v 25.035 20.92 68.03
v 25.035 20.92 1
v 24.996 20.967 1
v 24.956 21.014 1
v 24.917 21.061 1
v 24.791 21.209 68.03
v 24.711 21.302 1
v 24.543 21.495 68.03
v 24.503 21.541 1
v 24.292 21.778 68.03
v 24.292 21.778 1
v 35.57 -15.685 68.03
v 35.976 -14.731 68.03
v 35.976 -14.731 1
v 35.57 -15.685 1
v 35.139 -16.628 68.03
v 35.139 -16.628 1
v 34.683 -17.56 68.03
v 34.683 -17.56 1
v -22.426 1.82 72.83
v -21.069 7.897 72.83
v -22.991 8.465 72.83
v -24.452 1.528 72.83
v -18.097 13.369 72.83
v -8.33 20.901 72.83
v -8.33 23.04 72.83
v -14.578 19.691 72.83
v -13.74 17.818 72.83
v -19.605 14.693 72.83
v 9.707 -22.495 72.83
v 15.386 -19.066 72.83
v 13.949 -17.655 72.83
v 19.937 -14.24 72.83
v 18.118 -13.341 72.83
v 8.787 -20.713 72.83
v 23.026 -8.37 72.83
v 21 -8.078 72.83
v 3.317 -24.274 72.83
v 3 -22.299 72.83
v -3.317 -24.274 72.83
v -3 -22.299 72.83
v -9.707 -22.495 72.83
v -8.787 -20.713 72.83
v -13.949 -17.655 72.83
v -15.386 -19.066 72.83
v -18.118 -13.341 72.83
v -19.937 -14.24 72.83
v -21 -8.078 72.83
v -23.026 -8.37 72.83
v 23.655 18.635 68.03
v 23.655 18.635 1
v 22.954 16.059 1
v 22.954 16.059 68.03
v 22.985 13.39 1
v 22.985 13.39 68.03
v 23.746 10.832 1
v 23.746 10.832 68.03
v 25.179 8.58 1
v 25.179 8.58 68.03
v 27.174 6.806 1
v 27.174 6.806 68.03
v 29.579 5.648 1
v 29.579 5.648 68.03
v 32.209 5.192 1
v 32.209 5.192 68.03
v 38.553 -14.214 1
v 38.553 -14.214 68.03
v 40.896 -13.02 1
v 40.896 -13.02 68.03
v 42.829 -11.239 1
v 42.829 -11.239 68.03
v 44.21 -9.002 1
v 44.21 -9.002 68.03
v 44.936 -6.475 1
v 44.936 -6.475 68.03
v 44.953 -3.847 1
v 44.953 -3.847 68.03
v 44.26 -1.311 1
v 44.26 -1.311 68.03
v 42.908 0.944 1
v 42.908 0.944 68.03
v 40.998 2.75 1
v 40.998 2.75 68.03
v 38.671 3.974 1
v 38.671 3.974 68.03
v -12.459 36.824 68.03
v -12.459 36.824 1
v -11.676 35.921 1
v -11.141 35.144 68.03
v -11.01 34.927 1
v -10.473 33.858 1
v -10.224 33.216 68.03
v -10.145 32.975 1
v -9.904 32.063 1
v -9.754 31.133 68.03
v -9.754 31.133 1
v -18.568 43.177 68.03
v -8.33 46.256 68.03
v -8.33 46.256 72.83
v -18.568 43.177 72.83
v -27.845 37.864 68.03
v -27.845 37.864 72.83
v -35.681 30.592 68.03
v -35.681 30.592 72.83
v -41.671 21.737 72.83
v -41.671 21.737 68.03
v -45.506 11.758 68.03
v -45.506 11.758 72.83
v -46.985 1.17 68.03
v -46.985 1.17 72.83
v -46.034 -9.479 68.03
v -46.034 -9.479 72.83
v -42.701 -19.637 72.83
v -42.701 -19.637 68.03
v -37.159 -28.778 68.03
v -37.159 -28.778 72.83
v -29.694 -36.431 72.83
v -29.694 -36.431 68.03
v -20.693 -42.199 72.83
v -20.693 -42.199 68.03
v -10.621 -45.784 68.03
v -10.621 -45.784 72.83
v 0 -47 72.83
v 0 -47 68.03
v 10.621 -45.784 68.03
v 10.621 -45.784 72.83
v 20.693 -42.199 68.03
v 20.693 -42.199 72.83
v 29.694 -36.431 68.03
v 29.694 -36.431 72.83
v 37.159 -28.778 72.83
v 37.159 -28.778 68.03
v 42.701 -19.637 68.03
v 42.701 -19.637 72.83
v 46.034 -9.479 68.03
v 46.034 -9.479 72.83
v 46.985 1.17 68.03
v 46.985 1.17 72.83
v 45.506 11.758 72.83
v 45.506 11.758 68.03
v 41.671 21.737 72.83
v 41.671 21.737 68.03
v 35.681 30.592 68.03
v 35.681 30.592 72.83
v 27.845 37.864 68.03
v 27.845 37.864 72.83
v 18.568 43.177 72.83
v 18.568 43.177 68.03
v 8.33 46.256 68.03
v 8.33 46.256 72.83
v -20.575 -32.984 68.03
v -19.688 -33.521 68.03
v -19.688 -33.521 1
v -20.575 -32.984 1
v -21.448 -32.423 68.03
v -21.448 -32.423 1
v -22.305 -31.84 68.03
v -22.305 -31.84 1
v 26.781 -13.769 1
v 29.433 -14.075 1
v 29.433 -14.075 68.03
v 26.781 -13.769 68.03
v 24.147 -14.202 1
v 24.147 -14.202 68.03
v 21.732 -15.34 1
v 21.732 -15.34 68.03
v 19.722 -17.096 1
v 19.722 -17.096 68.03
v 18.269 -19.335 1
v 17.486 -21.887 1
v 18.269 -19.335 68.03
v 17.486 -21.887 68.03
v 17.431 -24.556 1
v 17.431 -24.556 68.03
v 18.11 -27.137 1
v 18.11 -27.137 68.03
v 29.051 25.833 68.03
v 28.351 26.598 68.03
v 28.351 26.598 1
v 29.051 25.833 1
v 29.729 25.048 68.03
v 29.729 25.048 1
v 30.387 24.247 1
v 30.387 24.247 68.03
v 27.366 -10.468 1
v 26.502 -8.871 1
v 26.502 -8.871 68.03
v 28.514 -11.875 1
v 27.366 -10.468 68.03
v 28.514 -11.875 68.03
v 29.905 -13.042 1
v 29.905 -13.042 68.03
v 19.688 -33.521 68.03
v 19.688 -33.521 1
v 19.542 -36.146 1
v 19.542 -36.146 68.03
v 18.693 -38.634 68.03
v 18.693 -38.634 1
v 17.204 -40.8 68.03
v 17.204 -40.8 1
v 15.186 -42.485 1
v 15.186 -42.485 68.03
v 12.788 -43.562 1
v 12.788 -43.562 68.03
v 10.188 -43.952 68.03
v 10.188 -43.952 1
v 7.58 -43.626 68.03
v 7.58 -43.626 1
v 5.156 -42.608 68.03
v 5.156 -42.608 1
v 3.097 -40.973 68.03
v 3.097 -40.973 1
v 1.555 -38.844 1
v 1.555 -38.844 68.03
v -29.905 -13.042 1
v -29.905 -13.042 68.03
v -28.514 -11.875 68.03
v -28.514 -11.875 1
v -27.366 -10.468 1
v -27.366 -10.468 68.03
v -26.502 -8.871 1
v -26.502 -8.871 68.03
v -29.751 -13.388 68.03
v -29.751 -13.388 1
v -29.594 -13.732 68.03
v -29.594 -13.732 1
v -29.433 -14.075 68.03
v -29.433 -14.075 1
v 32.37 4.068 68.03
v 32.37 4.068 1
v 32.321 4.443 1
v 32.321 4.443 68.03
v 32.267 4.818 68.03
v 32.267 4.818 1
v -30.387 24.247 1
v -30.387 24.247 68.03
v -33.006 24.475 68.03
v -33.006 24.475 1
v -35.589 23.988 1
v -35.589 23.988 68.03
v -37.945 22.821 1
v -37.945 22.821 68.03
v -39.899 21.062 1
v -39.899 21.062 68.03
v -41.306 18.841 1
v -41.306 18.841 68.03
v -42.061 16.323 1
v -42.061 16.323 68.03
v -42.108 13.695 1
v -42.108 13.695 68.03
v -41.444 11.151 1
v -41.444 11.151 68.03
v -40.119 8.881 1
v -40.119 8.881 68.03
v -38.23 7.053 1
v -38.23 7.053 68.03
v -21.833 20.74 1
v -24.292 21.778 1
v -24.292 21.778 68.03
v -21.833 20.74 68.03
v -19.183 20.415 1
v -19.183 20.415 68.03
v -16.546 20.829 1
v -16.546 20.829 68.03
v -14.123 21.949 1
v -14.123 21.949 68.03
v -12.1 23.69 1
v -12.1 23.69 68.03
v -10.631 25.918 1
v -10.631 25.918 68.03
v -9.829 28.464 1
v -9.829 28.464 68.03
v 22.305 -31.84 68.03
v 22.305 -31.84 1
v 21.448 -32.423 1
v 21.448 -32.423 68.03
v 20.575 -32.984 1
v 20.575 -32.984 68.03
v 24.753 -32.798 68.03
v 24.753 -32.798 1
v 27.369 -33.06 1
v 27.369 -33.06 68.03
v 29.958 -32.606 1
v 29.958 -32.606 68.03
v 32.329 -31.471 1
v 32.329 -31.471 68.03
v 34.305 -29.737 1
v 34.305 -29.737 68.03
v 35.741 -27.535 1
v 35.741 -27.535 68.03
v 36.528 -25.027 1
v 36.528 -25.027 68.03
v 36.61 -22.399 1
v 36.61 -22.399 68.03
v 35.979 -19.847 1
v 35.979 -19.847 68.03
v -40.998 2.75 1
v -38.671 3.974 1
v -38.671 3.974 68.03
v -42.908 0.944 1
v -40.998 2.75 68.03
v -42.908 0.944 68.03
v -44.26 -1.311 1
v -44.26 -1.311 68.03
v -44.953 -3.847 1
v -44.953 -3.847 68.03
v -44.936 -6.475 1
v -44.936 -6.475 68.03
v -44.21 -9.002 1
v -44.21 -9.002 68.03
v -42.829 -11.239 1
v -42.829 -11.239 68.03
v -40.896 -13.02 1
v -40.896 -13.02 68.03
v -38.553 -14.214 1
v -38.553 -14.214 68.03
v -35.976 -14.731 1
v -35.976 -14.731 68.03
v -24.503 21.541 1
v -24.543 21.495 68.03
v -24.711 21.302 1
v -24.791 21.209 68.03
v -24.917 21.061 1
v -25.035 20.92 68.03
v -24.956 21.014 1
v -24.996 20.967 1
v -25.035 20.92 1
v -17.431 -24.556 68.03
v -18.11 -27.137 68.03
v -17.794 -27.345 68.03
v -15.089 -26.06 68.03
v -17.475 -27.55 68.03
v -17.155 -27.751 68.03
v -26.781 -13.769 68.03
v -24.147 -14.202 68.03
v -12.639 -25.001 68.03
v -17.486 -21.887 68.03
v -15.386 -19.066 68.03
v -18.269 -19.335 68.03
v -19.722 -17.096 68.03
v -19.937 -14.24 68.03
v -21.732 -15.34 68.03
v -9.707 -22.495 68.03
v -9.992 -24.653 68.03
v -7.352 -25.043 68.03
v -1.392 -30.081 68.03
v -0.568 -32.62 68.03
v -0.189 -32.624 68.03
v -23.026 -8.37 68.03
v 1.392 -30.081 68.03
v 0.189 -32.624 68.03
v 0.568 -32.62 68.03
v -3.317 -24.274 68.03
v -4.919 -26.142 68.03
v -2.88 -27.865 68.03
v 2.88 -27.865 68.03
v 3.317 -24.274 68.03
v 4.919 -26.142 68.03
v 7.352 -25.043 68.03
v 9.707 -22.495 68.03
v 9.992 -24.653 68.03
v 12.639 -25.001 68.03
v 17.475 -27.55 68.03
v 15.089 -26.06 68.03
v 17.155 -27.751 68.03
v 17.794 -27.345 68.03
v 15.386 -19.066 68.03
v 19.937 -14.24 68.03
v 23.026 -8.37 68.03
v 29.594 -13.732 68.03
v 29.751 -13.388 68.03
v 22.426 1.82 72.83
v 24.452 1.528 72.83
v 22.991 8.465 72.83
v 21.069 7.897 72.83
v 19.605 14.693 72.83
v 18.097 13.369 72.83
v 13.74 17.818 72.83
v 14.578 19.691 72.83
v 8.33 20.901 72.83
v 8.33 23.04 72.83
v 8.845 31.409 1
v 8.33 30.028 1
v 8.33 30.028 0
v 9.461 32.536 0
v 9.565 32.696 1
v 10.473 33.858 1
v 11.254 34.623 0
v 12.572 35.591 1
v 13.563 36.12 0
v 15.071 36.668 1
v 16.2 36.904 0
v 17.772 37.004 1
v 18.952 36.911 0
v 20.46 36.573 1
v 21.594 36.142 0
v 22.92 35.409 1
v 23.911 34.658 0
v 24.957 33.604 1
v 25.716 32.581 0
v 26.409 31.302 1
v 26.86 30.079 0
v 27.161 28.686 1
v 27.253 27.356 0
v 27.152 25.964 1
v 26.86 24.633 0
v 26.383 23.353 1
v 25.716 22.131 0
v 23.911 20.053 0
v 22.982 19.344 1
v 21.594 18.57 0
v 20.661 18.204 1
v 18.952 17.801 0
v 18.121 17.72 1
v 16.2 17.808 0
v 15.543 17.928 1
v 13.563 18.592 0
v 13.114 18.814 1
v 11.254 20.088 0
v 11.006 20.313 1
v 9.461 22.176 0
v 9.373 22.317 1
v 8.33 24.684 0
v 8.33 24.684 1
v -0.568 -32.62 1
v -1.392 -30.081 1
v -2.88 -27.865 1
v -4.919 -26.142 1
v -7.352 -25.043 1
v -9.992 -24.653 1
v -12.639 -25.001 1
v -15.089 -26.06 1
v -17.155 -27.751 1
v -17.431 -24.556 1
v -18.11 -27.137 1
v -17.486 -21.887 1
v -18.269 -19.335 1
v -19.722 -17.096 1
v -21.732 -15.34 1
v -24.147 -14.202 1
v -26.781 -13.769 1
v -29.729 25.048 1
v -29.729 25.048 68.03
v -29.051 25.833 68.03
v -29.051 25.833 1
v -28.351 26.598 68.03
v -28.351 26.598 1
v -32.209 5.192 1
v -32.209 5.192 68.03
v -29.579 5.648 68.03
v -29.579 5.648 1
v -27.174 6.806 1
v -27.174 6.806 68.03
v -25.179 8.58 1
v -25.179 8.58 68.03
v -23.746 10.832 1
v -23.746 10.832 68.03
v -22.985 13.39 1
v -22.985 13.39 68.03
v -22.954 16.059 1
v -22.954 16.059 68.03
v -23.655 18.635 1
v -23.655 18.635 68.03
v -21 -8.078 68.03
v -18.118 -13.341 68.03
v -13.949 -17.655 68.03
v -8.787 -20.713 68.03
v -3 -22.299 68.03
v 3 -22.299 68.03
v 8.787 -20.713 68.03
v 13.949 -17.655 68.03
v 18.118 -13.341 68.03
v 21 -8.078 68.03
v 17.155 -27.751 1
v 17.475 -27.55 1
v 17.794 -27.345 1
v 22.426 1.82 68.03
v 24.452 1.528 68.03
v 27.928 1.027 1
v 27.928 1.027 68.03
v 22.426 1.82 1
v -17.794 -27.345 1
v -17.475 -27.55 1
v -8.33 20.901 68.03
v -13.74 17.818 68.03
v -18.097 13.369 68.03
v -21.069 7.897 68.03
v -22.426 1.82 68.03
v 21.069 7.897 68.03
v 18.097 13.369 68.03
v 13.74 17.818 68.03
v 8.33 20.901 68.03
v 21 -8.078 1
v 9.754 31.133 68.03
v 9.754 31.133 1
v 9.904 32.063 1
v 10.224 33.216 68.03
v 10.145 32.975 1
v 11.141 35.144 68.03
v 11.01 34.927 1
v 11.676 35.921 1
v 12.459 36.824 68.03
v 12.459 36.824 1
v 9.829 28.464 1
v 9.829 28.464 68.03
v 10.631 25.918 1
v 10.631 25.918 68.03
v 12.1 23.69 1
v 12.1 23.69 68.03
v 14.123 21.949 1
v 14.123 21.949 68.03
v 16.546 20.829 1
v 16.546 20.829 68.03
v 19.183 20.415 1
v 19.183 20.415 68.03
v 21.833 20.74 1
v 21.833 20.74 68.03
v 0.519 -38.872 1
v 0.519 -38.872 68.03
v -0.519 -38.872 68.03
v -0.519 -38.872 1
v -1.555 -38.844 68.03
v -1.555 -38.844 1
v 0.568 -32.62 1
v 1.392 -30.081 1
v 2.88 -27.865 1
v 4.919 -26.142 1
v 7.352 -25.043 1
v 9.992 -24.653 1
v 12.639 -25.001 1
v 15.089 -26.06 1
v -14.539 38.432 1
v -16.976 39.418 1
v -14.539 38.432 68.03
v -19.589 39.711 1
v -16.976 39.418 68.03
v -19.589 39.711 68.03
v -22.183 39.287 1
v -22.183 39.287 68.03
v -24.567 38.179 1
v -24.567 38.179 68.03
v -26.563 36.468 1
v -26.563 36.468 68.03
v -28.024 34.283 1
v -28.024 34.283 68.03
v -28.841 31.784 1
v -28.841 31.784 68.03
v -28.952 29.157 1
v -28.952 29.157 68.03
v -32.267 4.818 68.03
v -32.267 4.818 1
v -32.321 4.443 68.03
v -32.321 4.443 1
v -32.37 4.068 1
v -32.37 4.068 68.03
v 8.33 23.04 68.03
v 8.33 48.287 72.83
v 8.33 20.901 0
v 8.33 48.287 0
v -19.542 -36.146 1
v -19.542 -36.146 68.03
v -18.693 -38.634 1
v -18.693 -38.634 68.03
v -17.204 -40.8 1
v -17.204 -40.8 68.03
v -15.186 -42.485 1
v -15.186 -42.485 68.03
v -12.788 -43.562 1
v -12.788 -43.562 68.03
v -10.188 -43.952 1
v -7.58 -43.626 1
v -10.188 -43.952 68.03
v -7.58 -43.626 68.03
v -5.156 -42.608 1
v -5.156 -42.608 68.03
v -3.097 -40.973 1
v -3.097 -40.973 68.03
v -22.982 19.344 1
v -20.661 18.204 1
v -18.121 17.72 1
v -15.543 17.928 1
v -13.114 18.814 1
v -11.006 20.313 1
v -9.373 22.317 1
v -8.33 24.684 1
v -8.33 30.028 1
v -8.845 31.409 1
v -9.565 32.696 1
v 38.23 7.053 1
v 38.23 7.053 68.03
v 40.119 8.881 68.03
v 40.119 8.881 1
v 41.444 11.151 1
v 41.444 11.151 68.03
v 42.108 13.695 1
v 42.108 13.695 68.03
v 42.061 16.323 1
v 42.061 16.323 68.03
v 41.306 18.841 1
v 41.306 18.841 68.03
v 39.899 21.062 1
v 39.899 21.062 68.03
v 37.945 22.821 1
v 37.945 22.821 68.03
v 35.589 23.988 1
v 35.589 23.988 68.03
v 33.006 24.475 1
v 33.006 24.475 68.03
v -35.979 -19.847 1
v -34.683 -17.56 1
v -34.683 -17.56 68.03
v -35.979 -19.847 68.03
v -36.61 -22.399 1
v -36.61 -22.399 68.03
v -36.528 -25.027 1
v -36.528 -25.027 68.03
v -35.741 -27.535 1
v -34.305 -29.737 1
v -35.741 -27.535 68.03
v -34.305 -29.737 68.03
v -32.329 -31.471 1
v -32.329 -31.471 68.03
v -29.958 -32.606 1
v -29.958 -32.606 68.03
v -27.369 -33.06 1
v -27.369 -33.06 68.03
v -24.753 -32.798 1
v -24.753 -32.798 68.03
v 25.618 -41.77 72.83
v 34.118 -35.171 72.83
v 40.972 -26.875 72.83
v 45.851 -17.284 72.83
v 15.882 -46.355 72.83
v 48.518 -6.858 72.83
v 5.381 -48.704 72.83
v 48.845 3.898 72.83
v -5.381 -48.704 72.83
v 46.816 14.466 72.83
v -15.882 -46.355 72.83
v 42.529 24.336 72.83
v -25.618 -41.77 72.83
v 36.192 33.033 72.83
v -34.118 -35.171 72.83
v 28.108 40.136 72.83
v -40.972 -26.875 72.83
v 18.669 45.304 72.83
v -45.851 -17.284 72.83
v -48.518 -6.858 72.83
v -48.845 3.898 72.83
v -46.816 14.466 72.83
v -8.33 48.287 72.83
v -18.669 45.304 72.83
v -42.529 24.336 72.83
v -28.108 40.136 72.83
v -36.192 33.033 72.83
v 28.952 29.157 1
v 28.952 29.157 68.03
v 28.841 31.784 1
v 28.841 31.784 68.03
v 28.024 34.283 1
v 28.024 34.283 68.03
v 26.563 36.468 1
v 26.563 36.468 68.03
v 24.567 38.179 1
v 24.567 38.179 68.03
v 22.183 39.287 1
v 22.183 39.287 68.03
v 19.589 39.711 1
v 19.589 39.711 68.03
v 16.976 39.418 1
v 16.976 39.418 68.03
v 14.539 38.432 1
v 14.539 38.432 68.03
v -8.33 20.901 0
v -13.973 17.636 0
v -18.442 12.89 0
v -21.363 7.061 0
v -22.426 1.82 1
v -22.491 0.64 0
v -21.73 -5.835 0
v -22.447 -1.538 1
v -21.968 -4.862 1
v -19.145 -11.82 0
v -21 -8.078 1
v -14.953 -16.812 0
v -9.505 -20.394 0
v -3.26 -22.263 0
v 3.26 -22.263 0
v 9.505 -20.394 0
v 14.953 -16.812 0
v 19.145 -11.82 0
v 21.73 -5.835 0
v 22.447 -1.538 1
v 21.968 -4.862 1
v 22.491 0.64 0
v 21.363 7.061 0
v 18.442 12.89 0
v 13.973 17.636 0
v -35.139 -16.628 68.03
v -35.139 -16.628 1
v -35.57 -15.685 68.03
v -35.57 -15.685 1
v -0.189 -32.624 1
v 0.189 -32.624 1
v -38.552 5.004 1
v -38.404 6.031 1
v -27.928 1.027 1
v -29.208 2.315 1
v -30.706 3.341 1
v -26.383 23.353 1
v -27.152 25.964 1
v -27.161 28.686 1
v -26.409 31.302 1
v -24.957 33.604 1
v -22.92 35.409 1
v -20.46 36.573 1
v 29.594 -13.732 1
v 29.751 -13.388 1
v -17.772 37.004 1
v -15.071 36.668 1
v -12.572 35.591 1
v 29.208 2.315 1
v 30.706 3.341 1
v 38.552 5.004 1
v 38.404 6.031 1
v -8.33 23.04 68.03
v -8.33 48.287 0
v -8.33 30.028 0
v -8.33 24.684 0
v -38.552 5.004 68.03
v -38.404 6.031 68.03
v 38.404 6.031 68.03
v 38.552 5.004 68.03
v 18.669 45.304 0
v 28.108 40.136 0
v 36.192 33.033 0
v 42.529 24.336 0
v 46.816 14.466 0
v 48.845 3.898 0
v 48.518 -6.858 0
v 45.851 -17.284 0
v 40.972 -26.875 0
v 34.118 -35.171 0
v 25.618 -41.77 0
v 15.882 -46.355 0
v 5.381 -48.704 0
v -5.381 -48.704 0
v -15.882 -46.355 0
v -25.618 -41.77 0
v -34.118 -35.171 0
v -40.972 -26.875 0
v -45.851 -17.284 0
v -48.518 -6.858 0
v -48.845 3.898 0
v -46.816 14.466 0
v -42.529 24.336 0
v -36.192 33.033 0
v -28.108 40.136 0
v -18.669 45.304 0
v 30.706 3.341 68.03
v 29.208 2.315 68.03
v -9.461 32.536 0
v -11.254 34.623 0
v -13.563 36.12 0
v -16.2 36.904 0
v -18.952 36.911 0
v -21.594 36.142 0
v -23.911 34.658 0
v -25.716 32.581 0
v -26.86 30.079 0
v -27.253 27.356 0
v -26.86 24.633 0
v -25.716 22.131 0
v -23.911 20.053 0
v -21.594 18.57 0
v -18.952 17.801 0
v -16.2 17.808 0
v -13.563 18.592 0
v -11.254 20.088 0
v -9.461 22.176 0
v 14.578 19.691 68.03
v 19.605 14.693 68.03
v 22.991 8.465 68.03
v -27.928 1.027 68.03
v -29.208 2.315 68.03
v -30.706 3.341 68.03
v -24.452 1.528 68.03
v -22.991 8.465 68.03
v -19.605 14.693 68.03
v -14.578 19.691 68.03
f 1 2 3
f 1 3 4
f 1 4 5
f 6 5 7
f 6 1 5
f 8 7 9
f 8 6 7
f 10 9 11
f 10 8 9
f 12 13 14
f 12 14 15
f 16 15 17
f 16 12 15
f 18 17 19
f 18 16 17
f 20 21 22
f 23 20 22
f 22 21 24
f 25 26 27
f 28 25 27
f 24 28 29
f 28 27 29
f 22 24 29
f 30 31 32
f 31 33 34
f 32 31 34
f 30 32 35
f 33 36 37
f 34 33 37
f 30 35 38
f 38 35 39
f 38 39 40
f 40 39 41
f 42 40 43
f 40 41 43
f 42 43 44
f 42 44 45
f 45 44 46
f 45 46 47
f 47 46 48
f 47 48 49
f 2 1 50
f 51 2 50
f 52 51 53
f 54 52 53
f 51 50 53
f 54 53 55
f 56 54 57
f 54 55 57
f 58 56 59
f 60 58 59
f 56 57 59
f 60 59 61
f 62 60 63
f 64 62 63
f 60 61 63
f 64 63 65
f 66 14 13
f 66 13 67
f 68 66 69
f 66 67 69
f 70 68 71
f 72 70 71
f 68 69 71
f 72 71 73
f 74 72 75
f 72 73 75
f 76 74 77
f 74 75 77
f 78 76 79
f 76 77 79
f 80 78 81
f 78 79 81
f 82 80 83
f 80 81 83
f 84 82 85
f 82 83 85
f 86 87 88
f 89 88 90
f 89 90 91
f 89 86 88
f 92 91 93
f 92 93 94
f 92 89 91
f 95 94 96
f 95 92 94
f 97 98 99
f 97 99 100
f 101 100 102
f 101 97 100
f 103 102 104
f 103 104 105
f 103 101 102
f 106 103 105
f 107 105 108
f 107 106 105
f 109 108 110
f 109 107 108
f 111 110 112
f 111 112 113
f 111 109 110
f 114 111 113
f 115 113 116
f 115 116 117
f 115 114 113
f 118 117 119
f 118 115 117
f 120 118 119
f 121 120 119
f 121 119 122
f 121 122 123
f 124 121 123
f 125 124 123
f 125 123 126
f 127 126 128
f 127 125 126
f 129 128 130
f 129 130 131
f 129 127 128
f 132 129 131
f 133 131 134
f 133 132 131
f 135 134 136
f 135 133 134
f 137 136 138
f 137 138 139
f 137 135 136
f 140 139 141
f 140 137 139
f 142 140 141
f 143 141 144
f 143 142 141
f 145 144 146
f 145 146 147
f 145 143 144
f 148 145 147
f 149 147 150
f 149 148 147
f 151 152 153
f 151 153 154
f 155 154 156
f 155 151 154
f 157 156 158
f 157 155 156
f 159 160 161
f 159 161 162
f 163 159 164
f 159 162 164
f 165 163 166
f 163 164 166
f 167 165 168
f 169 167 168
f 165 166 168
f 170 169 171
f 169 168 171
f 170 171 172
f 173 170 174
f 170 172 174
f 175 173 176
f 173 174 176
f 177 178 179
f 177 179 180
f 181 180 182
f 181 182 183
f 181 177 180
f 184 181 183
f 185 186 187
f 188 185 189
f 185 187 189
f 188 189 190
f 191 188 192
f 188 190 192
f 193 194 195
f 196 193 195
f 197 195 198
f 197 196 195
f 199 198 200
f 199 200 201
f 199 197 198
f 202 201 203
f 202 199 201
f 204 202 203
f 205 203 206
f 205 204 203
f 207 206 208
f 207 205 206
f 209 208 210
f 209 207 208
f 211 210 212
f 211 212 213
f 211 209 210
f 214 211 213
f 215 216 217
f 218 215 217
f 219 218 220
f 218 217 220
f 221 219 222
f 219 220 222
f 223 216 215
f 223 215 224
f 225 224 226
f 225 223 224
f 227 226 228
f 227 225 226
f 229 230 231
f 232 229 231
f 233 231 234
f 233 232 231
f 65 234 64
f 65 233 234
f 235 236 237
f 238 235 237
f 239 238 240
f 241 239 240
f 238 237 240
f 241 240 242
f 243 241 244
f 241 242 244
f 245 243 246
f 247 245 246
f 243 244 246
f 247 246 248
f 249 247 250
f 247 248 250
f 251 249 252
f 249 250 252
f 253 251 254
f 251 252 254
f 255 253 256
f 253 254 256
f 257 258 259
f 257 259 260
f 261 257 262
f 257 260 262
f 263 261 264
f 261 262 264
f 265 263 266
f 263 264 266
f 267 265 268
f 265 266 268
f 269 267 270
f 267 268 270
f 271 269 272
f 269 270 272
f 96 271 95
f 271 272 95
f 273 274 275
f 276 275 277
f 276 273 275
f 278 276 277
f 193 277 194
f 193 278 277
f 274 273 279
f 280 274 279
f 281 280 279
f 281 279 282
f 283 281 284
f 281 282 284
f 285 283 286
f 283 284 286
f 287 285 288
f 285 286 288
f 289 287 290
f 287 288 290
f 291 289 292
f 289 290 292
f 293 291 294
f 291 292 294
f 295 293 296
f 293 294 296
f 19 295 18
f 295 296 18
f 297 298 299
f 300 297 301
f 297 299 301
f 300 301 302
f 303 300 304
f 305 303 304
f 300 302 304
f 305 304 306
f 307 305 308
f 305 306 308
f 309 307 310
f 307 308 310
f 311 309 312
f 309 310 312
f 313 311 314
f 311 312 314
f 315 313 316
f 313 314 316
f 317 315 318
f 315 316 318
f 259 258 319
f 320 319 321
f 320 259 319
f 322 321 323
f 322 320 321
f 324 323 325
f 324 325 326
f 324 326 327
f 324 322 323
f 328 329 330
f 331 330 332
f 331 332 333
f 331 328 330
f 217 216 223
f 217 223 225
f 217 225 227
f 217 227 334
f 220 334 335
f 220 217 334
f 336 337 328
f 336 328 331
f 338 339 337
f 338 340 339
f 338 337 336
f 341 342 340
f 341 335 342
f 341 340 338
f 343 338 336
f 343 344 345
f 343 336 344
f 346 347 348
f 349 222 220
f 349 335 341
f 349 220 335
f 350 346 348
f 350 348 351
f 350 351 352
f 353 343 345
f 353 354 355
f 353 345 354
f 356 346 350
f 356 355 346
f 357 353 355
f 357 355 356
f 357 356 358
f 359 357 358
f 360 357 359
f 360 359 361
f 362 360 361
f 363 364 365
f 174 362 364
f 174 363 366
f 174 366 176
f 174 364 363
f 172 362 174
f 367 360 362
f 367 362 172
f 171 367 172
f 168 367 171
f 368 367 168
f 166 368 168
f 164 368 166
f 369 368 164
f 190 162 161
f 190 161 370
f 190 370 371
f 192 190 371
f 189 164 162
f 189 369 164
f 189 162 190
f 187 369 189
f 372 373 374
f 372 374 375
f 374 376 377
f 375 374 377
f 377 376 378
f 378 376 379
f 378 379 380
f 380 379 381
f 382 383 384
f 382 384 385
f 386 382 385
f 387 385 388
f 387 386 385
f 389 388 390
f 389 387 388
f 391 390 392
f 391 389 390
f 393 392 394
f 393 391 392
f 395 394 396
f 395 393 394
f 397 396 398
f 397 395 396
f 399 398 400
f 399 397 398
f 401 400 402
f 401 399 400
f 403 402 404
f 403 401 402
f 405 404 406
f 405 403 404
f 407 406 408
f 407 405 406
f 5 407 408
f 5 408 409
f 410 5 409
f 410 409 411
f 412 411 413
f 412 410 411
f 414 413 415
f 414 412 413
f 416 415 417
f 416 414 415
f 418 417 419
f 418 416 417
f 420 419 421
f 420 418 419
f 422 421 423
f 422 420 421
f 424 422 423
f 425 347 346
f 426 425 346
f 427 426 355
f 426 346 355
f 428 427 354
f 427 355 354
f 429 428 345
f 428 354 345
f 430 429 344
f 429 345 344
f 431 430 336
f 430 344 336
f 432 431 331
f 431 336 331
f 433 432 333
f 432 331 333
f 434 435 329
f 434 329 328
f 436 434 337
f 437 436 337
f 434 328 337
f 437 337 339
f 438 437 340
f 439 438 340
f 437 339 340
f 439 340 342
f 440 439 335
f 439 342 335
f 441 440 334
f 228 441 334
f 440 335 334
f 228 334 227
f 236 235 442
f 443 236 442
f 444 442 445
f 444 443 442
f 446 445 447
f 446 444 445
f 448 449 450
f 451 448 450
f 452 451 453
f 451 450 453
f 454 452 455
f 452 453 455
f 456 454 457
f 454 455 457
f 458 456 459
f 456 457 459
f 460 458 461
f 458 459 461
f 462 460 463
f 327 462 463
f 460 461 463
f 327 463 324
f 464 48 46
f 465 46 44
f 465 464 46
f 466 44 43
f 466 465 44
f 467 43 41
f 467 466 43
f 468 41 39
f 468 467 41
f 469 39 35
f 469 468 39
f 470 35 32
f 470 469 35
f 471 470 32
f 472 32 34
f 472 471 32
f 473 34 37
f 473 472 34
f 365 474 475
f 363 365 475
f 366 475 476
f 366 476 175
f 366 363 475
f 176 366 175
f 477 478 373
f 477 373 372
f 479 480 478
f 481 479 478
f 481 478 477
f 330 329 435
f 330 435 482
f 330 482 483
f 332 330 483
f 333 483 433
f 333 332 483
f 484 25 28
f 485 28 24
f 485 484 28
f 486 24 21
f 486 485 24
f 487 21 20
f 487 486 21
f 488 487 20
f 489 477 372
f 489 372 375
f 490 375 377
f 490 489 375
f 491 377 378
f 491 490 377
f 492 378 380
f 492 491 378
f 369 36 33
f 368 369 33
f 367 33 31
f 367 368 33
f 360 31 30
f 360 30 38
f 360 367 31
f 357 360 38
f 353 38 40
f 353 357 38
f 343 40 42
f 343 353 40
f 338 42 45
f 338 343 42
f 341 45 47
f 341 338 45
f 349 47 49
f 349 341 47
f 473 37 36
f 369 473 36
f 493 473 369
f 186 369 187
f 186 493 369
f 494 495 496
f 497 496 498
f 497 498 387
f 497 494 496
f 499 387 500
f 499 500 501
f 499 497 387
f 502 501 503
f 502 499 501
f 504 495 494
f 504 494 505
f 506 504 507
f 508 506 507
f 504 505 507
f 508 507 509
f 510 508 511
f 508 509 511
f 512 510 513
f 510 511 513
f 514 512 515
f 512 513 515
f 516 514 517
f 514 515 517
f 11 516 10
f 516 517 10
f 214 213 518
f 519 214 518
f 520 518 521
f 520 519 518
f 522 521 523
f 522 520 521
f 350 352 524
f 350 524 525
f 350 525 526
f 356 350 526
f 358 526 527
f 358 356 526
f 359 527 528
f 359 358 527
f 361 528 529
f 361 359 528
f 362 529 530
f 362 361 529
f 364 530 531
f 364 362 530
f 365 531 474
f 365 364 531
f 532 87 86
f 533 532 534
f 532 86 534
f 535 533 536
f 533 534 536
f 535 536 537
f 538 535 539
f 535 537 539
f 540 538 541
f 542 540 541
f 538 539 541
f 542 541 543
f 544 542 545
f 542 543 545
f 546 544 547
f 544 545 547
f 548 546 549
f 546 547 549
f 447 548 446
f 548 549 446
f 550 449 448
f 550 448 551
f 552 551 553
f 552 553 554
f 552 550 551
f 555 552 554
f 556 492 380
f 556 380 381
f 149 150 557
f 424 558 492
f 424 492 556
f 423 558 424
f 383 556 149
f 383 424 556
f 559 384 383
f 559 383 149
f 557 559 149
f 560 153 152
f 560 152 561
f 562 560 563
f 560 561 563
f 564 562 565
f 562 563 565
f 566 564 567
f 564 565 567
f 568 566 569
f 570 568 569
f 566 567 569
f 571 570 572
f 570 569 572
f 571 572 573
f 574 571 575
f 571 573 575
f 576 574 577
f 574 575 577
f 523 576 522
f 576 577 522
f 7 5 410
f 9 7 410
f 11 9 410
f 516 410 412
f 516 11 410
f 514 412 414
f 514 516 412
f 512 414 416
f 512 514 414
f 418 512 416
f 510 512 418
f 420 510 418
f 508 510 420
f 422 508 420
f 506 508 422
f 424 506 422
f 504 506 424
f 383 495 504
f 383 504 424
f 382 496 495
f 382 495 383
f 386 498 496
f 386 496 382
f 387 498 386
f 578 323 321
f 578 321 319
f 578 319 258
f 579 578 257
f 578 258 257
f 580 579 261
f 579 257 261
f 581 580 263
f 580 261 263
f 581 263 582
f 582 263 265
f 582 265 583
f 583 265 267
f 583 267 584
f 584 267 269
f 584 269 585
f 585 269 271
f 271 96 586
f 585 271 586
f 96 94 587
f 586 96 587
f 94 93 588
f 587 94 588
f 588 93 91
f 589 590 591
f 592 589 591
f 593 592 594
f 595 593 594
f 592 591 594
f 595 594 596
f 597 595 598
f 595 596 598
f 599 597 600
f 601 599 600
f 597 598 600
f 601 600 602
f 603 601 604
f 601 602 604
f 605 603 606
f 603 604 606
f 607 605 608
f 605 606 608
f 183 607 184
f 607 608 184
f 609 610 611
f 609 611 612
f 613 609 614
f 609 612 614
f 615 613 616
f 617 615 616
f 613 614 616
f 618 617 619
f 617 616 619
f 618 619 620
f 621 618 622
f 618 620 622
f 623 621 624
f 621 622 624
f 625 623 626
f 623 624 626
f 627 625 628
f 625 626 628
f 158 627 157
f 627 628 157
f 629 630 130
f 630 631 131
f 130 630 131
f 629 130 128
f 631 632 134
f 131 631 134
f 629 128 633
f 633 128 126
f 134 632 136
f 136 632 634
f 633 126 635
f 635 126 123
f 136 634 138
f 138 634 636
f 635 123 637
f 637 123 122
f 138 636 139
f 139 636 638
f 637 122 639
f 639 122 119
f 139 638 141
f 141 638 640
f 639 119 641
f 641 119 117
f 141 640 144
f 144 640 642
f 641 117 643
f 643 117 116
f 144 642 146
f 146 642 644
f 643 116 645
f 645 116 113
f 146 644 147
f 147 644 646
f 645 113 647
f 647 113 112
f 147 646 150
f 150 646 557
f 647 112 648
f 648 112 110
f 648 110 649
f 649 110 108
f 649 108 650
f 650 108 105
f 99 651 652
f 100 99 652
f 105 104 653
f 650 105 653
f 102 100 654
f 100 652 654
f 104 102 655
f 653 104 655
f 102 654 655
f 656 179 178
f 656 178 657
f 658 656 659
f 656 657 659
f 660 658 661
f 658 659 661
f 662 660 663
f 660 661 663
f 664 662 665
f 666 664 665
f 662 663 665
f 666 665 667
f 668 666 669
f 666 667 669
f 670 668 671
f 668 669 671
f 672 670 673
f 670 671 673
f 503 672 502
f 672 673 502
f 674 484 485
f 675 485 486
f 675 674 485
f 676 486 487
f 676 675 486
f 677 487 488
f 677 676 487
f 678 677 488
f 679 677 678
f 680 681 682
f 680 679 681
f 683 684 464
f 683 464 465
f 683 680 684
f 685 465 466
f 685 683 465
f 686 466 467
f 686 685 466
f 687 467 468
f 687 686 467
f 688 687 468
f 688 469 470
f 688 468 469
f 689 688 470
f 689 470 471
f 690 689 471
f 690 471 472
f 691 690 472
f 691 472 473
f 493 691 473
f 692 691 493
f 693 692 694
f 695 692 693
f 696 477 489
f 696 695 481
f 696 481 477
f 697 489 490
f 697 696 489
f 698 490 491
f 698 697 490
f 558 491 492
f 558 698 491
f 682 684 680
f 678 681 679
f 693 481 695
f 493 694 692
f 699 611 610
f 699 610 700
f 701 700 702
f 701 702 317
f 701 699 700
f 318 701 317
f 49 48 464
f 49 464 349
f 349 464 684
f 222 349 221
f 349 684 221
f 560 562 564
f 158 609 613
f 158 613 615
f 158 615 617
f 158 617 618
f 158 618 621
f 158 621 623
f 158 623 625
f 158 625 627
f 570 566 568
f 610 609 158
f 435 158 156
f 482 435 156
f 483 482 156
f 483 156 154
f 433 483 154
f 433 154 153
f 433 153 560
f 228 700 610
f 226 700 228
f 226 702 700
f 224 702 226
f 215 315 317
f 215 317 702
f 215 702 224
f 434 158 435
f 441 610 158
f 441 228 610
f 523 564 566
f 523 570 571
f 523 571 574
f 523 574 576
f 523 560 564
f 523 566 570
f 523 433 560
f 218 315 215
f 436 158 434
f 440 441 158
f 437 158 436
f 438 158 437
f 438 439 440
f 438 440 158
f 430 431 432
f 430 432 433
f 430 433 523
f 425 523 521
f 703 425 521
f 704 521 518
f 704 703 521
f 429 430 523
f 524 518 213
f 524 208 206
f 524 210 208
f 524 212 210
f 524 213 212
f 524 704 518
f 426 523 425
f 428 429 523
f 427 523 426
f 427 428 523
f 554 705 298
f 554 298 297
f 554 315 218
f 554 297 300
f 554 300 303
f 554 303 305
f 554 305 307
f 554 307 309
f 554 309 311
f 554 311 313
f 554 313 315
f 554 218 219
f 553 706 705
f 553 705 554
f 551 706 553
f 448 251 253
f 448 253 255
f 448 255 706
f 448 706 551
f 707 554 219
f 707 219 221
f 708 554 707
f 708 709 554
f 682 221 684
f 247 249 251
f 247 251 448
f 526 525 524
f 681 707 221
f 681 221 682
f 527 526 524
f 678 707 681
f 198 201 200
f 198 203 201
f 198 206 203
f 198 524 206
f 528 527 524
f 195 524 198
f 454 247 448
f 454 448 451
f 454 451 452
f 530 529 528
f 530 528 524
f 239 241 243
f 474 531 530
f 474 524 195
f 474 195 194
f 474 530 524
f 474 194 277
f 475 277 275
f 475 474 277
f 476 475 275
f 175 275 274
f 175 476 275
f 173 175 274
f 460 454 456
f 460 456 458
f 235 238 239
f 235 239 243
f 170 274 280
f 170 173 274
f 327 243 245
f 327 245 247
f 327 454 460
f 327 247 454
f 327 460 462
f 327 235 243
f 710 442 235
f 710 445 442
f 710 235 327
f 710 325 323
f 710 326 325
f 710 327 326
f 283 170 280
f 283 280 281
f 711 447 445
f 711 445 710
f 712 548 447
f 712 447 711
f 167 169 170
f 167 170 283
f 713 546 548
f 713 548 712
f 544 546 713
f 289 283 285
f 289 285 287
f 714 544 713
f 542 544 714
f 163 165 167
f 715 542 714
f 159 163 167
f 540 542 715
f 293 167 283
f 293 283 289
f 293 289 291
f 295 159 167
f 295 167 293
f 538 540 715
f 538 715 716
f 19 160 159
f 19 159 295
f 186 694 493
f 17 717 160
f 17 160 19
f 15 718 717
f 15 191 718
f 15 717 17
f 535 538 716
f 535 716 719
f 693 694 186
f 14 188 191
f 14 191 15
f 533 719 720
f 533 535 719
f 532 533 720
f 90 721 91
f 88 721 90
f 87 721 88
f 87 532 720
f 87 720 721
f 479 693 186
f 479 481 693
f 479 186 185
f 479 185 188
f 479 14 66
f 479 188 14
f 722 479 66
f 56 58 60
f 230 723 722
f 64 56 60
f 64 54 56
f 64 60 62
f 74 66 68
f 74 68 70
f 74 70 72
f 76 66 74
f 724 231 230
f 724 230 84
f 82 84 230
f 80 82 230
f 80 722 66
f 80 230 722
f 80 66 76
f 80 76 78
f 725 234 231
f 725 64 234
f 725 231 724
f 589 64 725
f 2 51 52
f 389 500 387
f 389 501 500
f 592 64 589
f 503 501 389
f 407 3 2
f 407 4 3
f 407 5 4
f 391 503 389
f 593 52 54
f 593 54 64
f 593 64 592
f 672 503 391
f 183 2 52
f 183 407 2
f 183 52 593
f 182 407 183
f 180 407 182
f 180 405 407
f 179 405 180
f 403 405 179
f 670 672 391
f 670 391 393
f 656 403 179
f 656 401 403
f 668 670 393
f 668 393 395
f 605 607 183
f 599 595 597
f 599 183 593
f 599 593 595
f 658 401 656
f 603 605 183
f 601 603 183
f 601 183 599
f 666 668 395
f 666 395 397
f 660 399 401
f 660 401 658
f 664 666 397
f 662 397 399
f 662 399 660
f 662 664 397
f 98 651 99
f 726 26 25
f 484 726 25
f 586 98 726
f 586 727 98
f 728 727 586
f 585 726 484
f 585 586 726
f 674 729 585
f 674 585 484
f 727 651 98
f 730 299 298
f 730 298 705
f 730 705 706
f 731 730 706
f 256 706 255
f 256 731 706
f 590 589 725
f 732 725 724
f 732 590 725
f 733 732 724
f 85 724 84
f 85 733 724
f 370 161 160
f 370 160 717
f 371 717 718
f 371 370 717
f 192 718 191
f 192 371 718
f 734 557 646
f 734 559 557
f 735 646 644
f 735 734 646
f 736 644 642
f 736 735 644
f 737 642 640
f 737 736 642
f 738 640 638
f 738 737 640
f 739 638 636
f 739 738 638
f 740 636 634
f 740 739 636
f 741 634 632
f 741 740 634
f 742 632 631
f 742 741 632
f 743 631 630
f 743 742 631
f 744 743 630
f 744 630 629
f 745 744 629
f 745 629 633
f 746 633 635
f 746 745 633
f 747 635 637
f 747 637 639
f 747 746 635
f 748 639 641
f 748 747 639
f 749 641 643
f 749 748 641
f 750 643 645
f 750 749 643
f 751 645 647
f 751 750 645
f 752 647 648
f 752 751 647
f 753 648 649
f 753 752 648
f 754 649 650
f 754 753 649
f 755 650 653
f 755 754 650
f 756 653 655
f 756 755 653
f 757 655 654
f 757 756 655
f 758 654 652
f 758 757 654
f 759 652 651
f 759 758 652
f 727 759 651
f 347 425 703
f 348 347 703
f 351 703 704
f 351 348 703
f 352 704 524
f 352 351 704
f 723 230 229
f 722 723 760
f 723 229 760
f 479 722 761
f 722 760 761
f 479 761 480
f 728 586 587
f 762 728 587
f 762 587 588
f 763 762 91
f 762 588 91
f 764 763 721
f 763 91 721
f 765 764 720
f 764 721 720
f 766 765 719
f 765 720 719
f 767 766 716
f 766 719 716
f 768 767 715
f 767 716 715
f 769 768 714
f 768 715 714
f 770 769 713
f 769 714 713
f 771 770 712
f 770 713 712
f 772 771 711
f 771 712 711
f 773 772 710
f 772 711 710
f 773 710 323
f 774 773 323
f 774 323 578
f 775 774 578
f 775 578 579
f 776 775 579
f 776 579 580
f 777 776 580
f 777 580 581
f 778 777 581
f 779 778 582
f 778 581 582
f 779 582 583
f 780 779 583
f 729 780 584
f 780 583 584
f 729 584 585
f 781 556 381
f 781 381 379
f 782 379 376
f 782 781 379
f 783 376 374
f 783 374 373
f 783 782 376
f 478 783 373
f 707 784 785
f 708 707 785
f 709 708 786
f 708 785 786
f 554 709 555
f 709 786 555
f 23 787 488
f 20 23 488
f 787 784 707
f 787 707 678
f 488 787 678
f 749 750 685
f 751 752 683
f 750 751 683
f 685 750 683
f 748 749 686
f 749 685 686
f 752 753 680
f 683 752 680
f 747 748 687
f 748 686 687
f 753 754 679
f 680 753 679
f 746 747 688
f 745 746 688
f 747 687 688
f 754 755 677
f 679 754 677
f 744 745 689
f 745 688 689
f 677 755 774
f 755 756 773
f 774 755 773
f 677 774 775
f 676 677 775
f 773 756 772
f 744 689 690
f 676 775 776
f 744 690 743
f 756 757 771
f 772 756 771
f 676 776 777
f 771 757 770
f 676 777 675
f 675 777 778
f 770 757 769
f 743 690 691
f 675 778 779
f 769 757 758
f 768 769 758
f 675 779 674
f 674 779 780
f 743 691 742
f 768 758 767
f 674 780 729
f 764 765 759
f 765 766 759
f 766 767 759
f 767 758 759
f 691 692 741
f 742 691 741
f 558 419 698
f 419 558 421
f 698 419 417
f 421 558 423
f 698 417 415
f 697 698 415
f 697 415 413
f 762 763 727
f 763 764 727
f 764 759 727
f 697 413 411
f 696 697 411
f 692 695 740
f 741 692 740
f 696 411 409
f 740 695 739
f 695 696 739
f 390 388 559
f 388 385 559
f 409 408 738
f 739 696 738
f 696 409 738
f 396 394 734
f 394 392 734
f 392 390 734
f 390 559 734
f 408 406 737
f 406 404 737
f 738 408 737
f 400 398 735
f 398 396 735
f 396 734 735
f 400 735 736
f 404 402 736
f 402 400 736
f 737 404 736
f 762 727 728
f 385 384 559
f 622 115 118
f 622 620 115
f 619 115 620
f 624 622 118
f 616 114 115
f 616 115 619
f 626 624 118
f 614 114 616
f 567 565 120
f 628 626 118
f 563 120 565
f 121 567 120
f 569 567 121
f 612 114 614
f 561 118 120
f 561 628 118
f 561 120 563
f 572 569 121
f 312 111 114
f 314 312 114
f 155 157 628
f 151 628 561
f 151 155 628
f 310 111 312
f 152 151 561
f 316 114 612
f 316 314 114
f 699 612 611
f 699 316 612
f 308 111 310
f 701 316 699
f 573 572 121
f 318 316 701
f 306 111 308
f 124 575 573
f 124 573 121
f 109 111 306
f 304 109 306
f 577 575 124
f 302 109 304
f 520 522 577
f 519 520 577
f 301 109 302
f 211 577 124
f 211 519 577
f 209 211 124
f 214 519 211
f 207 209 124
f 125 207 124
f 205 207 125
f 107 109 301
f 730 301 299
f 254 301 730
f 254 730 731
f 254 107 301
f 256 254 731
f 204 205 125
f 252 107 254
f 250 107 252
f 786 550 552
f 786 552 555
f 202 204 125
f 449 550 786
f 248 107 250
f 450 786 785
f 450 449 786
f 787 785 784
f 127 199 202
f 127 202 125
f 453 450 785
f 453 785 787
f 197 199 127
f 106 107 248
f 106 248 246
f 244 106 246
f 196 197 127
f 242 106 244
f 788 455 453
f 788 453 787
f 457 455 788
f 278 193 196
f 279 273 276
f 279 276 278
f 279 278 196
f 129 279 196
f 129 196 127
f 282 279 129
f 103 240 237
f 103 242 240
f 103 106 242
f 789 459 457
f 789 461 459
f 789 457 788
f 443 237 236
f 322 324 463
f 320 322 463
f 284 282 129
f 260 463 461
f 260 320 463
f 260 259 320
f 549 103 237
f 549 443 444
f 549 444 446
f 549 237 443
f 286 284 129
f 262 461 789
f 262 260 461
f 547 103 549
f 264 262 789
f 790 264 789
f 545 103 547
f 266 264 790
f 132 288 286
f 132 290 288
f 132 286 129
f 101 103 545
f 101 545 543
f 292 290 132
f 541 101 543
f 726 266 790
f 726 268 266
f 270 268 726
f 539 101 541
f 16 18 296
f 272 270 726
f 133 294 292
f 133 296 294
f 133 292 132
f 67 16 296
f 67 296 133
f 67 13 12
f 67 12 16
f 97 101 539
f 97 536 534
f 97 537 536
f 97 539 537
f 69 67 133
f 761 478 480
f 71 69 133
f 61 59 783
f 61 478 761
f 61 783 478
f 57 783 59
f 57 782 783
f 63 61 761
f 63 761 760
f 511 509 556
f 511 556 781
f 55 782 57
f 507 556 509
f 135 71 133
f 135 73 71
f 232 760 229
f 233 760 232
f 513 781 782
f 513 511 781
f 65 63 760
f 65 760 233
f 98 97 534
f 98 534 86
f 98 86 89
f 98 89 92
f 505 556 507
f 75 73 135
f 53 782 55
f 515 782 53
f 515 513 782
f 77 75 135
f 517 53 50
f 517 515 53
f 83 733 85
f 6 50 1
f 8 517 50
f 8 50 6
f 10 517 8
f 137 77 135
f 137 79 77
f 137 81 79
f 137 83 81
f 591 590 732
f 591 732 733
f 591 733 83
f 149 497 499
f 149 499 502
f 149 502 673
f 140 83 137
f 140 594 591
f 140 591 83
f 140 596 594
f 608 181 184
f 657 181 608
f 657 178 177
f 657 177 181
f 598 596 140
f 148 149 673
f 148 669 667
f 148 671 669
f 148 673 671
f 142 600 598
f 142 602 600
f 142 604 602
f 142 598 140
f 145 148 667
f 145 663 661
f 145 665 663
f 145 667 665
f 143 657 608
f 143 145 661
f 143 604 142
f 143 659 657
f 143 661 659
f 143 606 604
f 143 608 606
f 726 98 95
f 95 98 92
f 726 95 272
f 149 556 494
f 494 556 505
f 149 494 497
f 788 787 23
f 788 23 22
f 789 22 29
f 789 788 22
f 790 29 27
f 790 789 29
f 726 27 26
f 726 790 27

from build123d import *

# Parameters (mm, degrees)
BASIC_SHAPE_SKETCH_R                = 49
BASIC_SHAPE_SKETCH_R_2              = 22.5
BASIC_SHAPE_DEPTH                   = 68.03
SLIT_DEPTH                          = 98.108603635
BATTERY_SLOT_SKETCH_R               = 9.65
BATTERY_SLOT_DEPTH                  = 67.03
PATTERN_BATTERY_SLOT_COUNT          = 5
PATTERN_BATTERY_SLOT_ANGLE          = 130.88
MIRROR_BATTERY_SLOT_COPY_1_SKETCH_R = 9.65
MIRROR_BATTERY_SLOT_COPY_1_DEPTH    = 67.03
MIRROR_BATTERY_SLOT_COPY_2_SKETCH_R = 9.65
MIRROR_BATTERY_SLOT_COPY_2_DEPTH    = 67.03
MIRROR_BATTERY_SLOT_COPY_3_SKETCH_R = 9.65
MIRROR_BATTERY_SLOT_COPY_3_DEPTH    = 67.03
MIRROR_BATTERY_SLOT_COPY_4_SKETCH_R = 9.65
MIRROR_BATTERY_SLOT_COPY_4_DEPTH    = 67.03
BUS_SLIT_DEPTH                      = 67.03
CAP_INNER_LIP_DEPTH                 = 4.8
CAP_OUTER_LIP_DEPTH                 = 4.8
WIRE_SLITS_DEPTH                    = 98.108603635
WIRE_SLITS_DEPTH_BACK               = 67.03
PENNY_HOLE_SKETCH_R                 = 9.65
PENNY_HOLE_DEPTH                    = 100.807559333


with BuildPart() as part:
    # Basic_Shape_Sketch → Basic_Shape (new body)
    with BuildSketch(Plane.XY):
        Circle(BASIC_SHAPE_SKETCH_R)
        Circle(BASIC_SHAPE_SKETCH_R_2, mode=Mode.SUBTRACT)
    extrude(amount=BASIC_SHAPE_DEPTH)

    # Slit_Sketch → Slit (cut, through all)
    with BuildSketch(Plane.XY.offset(68.03)):
        with BuildLine():
            Line((-8.33, 48.286759055), (-8.33, 20.901222452))
            Line((-8.33, 20.901222452), (8.33, 20.901222452))
            Line((8.33, 20.901222452), (8.33, 48.286759055))
            ThreePointArc((8.33, 48.286759055), (0, 56.616759055), (-8.33, 48.286759055))
        make_face()
    extrude(amount=-SLIT_DEPTH, mode=Mode.SUBTRACT)

    # Battery_Slot_Sketch → Battery_Slot (cut)
    with BuildSketch(Plane.XY.offset(68.03)):
        with Locations((-10.069761866, -34.302512969)):
            Circle(BATTERY_SLOT_SKETCH_R)
    battery_slot = extrude(amount=-BATTERY_SLOT_DEPTH, mode=Mode.SUBTRACT)

    # Pattern_Battery_Slot: Battery_Slot ×5 about axis
    pattern_battery_slot_axis = Axis((0, 0, 0), (0, 0, -1))
    for i in range(1, PATTERN_BATTERY_SLOT_COUNT):
        add(battery_slot.rotate(pattern_battery_slot_axis, i * PATTERN_BATTERY_SLOT_ANGLE / (PATTERN_BATTERY_SLOT_COUNT - 1)), mode=Mode.SUBTRACT)

    # Mirror_Battery_Slot: Battery_Slot across plane
    add(battery_slot.mirror(Plane(origin=(0, 0, 0), x_dir=(0, 0, 1), z_dir=(1, 0, 0))), mode=Mode.SUBTRACT)

    # Mirror_Battery_Slot copy 1 sketch → Mirror_Battery_Slot copy 1 (cut)
    with BuildSketch(Plane(origin=(0, 0, 68.03), x_dir=(-0.8413221512344797, -0.5405340302350882, 0), z_dir=(0, 0, 1))):
        with Locations((-10.069761866, 34.302512969)):
            Circle(MIRROR_BATTERY_SLOT_COPY_1_SKETCH_R)
    extrude(amount=-MIRROR_BATTERY_SLOT_COPY_1_DEPTH, mode=Mode.SUBTRACT)

    # Mirror_Battery_Slot copy 2 sketch → Mirror_Battery_Slot copy 2 (cut)
    with BuildSketch(Plane(origin=(0, 0, 68.03), x_dir=(-0.4156459243156256, -0.9095265062656553, 0), z_dir=(0, 0, 1))):
        with Locations((-10.069761866, 34.302512969)):
            Circle(MIRROR_BATTERY_SLOT_COPY_2_SKETCH_R)
    extrude(amount=-MIRROR_BATTERY_SLOT_COPY_2_DEPTH, mode=Mode.SUBTRACT)

    # Mirror_Battery_Slot copy 3 sketch → Mirror_Battery_Slot copy 3 (cut)
    with BuildSketch(Plane(origin=(0, 0, 68.03), x_dir=(0.14193790484034807, -0.9898755634773152, 0), z_dir=(0, 0, 1))):
        with Locations((-10.069761866, 34.302512969)):
            Circle(MIRROR_BATTERY_SLOT_COPY_3_SKETCH_R)
    extrude(amount=-MIRROR_BATTERY_SLOT_COPY_3_DEPTH, mode=Mode.SUBTRACT)

    # Mirror_Battery_Slot copy 4 sketch → Mirror_Battery_Slot copy 4 (cut)
    with BuildSketch(Plane(origin=(0, 0, 68.03), x_dir=(0.6544769311996185, -0.7560819707726999, 0), z_dir=(0, 0, 1))):
        with Locations((-10.069761866, 34.302512969)):
            Circle(MIRROR_BATTERY_SLOT_COPY_4_SKETCH_R)
    extrude(amount=-MIRROR_BATTERY_SLOT_COPY_4_DEPTH, mode=Mode.SUBTRACT)

    # Bus_Slit_Sketch → Bus_Slit (cut)
    with BuildSketch(Plane.XY.offset(68.03)):
        with BuildLine():
            ThreePointArc((-9.754463235, 31.132636766), (0, -32.625), (9.754463235, 31.132636766))
            ThreePointArc((9.754463235, 31.132636766), (10.629095474, 34.20551129), (12.459123069, 36.824392423))
            ThreePointArc((12.459123069, 36.824392423), (0, -38.875), (-12.459123069, 36.824392423))
            ThreePointArc((-12.459123069, 36.824392423), (-10.629095474, 34.20551129), (-9.754463235, 31.132636766))
        make_face()
    extrude(amount=-BUS_SLIT_DEPTH, mode=Mode.SUBTRACT)

    # Cap_Inner_Lip_Sketch → Cap_Inner_Lip (add)
    with BuildSketch(Plane.XY.offset(68.03)):
        with BuildLine():
            Line((-8.33, 23.040423173), (-8.33, 20.901222452))
            ThreePointArc((-8.33, 20.901222452), (0, -22.5), (8.33, 20.901222452))
            Line((8.33, 20.901222452), (8.33, 23.040423173))
            ThreePointArc((8.33, 23.040423173), (0, -24.5), (-8.33, 23.040423173))
        make_face()
    extrude(amount=CAP_INNER_LIP_DEPTH)

    # Cap_Outer_Lip_Sketch → Cap_Outer_Lip (add)
    with BuildSketch(Plane.XY.offset(68.03)):
        with BuildLine():
            Line((-8.33, 48.286759055), (-8.33, 46.255930431))
            ThreePointArc((-8.33, 46.255930431), (0, -47), (8.33, 46.255930431))
            Line((8.33, 46.255930431), (8.33, 48.286759055))
            ThreePointArc((8.33, 48.286759055), (0, -49), (-8.33, 48.286759055))
        make_face()
    extrude(amount=CAP_OUTER_LIP_DEPTH)

    # Wire_Slits_Sketch → Wire_Slits (cut, two sides: drawn at the far end of the back side and taken through both)
    with BuildSketch(Plane.XY.offset(68.03).offset(-WIRE_SLITS_DEPTH_BACK)):
        with BuildLine():
            Line((-34.213144669, 0.12145741), (-17.213144669, 2.571194832))
            ThreePointArc((-17.213144669, 2.571194832), (-11.551118845, -1.664541654), (-15.786855331, -7.326567477))
            Line((-15.786855331, -7.326567477), (-32.786855331, -9.776304899))
            ThreePointArc((-32.786855331, -9.776304899), (-38.448881155, -5.540568413), (-34.213144669, 0.12145741))
        make_face()
        with BuildLine():
            Line((34.213144669, 0.12145741), (17.213144669, 2.571194832))
            ThreePointArc((17.213144669, 2.571194832), (11.551118845, -1.664541654), (15.786855331, -7.326567477))
            Line((15.786855331, -7.326567477), (32.786855331, -9.776304899))
            ThreePointArc((32.786855331, -9.776304899), (38.448881155, -5.540568413), (34.213144669, 0.12145741))
        make_face()
    extrude(amount=WIRE_SLITS_DEPTH + WIRE_SLITS_DEPTH_BACK, mode=Mode.SUBTRACT)

    # Penny Hole Sketch → Penny Hole (cut, through all)
    with BuildSketch(Plane.XY.offset(1)):
        with Locations((-17.602674332, 27.355927262)):
            Circle(PENNY_HOLE_SKETCH_R)
    penny_hole = extrude(amount=-PENNY_HOLE_DEPTH, mode=Mode.SUBTRACT)

    # Penny Hole Mirror: Penny Hole across plane
    add(penny_hole.mirror(Plane(origin=(0, 0, 0), x_dir=(0, 0, 1), z_dir=(1, 0, 0))), mode=Mode.SUBTRACT)


solid = part.part
